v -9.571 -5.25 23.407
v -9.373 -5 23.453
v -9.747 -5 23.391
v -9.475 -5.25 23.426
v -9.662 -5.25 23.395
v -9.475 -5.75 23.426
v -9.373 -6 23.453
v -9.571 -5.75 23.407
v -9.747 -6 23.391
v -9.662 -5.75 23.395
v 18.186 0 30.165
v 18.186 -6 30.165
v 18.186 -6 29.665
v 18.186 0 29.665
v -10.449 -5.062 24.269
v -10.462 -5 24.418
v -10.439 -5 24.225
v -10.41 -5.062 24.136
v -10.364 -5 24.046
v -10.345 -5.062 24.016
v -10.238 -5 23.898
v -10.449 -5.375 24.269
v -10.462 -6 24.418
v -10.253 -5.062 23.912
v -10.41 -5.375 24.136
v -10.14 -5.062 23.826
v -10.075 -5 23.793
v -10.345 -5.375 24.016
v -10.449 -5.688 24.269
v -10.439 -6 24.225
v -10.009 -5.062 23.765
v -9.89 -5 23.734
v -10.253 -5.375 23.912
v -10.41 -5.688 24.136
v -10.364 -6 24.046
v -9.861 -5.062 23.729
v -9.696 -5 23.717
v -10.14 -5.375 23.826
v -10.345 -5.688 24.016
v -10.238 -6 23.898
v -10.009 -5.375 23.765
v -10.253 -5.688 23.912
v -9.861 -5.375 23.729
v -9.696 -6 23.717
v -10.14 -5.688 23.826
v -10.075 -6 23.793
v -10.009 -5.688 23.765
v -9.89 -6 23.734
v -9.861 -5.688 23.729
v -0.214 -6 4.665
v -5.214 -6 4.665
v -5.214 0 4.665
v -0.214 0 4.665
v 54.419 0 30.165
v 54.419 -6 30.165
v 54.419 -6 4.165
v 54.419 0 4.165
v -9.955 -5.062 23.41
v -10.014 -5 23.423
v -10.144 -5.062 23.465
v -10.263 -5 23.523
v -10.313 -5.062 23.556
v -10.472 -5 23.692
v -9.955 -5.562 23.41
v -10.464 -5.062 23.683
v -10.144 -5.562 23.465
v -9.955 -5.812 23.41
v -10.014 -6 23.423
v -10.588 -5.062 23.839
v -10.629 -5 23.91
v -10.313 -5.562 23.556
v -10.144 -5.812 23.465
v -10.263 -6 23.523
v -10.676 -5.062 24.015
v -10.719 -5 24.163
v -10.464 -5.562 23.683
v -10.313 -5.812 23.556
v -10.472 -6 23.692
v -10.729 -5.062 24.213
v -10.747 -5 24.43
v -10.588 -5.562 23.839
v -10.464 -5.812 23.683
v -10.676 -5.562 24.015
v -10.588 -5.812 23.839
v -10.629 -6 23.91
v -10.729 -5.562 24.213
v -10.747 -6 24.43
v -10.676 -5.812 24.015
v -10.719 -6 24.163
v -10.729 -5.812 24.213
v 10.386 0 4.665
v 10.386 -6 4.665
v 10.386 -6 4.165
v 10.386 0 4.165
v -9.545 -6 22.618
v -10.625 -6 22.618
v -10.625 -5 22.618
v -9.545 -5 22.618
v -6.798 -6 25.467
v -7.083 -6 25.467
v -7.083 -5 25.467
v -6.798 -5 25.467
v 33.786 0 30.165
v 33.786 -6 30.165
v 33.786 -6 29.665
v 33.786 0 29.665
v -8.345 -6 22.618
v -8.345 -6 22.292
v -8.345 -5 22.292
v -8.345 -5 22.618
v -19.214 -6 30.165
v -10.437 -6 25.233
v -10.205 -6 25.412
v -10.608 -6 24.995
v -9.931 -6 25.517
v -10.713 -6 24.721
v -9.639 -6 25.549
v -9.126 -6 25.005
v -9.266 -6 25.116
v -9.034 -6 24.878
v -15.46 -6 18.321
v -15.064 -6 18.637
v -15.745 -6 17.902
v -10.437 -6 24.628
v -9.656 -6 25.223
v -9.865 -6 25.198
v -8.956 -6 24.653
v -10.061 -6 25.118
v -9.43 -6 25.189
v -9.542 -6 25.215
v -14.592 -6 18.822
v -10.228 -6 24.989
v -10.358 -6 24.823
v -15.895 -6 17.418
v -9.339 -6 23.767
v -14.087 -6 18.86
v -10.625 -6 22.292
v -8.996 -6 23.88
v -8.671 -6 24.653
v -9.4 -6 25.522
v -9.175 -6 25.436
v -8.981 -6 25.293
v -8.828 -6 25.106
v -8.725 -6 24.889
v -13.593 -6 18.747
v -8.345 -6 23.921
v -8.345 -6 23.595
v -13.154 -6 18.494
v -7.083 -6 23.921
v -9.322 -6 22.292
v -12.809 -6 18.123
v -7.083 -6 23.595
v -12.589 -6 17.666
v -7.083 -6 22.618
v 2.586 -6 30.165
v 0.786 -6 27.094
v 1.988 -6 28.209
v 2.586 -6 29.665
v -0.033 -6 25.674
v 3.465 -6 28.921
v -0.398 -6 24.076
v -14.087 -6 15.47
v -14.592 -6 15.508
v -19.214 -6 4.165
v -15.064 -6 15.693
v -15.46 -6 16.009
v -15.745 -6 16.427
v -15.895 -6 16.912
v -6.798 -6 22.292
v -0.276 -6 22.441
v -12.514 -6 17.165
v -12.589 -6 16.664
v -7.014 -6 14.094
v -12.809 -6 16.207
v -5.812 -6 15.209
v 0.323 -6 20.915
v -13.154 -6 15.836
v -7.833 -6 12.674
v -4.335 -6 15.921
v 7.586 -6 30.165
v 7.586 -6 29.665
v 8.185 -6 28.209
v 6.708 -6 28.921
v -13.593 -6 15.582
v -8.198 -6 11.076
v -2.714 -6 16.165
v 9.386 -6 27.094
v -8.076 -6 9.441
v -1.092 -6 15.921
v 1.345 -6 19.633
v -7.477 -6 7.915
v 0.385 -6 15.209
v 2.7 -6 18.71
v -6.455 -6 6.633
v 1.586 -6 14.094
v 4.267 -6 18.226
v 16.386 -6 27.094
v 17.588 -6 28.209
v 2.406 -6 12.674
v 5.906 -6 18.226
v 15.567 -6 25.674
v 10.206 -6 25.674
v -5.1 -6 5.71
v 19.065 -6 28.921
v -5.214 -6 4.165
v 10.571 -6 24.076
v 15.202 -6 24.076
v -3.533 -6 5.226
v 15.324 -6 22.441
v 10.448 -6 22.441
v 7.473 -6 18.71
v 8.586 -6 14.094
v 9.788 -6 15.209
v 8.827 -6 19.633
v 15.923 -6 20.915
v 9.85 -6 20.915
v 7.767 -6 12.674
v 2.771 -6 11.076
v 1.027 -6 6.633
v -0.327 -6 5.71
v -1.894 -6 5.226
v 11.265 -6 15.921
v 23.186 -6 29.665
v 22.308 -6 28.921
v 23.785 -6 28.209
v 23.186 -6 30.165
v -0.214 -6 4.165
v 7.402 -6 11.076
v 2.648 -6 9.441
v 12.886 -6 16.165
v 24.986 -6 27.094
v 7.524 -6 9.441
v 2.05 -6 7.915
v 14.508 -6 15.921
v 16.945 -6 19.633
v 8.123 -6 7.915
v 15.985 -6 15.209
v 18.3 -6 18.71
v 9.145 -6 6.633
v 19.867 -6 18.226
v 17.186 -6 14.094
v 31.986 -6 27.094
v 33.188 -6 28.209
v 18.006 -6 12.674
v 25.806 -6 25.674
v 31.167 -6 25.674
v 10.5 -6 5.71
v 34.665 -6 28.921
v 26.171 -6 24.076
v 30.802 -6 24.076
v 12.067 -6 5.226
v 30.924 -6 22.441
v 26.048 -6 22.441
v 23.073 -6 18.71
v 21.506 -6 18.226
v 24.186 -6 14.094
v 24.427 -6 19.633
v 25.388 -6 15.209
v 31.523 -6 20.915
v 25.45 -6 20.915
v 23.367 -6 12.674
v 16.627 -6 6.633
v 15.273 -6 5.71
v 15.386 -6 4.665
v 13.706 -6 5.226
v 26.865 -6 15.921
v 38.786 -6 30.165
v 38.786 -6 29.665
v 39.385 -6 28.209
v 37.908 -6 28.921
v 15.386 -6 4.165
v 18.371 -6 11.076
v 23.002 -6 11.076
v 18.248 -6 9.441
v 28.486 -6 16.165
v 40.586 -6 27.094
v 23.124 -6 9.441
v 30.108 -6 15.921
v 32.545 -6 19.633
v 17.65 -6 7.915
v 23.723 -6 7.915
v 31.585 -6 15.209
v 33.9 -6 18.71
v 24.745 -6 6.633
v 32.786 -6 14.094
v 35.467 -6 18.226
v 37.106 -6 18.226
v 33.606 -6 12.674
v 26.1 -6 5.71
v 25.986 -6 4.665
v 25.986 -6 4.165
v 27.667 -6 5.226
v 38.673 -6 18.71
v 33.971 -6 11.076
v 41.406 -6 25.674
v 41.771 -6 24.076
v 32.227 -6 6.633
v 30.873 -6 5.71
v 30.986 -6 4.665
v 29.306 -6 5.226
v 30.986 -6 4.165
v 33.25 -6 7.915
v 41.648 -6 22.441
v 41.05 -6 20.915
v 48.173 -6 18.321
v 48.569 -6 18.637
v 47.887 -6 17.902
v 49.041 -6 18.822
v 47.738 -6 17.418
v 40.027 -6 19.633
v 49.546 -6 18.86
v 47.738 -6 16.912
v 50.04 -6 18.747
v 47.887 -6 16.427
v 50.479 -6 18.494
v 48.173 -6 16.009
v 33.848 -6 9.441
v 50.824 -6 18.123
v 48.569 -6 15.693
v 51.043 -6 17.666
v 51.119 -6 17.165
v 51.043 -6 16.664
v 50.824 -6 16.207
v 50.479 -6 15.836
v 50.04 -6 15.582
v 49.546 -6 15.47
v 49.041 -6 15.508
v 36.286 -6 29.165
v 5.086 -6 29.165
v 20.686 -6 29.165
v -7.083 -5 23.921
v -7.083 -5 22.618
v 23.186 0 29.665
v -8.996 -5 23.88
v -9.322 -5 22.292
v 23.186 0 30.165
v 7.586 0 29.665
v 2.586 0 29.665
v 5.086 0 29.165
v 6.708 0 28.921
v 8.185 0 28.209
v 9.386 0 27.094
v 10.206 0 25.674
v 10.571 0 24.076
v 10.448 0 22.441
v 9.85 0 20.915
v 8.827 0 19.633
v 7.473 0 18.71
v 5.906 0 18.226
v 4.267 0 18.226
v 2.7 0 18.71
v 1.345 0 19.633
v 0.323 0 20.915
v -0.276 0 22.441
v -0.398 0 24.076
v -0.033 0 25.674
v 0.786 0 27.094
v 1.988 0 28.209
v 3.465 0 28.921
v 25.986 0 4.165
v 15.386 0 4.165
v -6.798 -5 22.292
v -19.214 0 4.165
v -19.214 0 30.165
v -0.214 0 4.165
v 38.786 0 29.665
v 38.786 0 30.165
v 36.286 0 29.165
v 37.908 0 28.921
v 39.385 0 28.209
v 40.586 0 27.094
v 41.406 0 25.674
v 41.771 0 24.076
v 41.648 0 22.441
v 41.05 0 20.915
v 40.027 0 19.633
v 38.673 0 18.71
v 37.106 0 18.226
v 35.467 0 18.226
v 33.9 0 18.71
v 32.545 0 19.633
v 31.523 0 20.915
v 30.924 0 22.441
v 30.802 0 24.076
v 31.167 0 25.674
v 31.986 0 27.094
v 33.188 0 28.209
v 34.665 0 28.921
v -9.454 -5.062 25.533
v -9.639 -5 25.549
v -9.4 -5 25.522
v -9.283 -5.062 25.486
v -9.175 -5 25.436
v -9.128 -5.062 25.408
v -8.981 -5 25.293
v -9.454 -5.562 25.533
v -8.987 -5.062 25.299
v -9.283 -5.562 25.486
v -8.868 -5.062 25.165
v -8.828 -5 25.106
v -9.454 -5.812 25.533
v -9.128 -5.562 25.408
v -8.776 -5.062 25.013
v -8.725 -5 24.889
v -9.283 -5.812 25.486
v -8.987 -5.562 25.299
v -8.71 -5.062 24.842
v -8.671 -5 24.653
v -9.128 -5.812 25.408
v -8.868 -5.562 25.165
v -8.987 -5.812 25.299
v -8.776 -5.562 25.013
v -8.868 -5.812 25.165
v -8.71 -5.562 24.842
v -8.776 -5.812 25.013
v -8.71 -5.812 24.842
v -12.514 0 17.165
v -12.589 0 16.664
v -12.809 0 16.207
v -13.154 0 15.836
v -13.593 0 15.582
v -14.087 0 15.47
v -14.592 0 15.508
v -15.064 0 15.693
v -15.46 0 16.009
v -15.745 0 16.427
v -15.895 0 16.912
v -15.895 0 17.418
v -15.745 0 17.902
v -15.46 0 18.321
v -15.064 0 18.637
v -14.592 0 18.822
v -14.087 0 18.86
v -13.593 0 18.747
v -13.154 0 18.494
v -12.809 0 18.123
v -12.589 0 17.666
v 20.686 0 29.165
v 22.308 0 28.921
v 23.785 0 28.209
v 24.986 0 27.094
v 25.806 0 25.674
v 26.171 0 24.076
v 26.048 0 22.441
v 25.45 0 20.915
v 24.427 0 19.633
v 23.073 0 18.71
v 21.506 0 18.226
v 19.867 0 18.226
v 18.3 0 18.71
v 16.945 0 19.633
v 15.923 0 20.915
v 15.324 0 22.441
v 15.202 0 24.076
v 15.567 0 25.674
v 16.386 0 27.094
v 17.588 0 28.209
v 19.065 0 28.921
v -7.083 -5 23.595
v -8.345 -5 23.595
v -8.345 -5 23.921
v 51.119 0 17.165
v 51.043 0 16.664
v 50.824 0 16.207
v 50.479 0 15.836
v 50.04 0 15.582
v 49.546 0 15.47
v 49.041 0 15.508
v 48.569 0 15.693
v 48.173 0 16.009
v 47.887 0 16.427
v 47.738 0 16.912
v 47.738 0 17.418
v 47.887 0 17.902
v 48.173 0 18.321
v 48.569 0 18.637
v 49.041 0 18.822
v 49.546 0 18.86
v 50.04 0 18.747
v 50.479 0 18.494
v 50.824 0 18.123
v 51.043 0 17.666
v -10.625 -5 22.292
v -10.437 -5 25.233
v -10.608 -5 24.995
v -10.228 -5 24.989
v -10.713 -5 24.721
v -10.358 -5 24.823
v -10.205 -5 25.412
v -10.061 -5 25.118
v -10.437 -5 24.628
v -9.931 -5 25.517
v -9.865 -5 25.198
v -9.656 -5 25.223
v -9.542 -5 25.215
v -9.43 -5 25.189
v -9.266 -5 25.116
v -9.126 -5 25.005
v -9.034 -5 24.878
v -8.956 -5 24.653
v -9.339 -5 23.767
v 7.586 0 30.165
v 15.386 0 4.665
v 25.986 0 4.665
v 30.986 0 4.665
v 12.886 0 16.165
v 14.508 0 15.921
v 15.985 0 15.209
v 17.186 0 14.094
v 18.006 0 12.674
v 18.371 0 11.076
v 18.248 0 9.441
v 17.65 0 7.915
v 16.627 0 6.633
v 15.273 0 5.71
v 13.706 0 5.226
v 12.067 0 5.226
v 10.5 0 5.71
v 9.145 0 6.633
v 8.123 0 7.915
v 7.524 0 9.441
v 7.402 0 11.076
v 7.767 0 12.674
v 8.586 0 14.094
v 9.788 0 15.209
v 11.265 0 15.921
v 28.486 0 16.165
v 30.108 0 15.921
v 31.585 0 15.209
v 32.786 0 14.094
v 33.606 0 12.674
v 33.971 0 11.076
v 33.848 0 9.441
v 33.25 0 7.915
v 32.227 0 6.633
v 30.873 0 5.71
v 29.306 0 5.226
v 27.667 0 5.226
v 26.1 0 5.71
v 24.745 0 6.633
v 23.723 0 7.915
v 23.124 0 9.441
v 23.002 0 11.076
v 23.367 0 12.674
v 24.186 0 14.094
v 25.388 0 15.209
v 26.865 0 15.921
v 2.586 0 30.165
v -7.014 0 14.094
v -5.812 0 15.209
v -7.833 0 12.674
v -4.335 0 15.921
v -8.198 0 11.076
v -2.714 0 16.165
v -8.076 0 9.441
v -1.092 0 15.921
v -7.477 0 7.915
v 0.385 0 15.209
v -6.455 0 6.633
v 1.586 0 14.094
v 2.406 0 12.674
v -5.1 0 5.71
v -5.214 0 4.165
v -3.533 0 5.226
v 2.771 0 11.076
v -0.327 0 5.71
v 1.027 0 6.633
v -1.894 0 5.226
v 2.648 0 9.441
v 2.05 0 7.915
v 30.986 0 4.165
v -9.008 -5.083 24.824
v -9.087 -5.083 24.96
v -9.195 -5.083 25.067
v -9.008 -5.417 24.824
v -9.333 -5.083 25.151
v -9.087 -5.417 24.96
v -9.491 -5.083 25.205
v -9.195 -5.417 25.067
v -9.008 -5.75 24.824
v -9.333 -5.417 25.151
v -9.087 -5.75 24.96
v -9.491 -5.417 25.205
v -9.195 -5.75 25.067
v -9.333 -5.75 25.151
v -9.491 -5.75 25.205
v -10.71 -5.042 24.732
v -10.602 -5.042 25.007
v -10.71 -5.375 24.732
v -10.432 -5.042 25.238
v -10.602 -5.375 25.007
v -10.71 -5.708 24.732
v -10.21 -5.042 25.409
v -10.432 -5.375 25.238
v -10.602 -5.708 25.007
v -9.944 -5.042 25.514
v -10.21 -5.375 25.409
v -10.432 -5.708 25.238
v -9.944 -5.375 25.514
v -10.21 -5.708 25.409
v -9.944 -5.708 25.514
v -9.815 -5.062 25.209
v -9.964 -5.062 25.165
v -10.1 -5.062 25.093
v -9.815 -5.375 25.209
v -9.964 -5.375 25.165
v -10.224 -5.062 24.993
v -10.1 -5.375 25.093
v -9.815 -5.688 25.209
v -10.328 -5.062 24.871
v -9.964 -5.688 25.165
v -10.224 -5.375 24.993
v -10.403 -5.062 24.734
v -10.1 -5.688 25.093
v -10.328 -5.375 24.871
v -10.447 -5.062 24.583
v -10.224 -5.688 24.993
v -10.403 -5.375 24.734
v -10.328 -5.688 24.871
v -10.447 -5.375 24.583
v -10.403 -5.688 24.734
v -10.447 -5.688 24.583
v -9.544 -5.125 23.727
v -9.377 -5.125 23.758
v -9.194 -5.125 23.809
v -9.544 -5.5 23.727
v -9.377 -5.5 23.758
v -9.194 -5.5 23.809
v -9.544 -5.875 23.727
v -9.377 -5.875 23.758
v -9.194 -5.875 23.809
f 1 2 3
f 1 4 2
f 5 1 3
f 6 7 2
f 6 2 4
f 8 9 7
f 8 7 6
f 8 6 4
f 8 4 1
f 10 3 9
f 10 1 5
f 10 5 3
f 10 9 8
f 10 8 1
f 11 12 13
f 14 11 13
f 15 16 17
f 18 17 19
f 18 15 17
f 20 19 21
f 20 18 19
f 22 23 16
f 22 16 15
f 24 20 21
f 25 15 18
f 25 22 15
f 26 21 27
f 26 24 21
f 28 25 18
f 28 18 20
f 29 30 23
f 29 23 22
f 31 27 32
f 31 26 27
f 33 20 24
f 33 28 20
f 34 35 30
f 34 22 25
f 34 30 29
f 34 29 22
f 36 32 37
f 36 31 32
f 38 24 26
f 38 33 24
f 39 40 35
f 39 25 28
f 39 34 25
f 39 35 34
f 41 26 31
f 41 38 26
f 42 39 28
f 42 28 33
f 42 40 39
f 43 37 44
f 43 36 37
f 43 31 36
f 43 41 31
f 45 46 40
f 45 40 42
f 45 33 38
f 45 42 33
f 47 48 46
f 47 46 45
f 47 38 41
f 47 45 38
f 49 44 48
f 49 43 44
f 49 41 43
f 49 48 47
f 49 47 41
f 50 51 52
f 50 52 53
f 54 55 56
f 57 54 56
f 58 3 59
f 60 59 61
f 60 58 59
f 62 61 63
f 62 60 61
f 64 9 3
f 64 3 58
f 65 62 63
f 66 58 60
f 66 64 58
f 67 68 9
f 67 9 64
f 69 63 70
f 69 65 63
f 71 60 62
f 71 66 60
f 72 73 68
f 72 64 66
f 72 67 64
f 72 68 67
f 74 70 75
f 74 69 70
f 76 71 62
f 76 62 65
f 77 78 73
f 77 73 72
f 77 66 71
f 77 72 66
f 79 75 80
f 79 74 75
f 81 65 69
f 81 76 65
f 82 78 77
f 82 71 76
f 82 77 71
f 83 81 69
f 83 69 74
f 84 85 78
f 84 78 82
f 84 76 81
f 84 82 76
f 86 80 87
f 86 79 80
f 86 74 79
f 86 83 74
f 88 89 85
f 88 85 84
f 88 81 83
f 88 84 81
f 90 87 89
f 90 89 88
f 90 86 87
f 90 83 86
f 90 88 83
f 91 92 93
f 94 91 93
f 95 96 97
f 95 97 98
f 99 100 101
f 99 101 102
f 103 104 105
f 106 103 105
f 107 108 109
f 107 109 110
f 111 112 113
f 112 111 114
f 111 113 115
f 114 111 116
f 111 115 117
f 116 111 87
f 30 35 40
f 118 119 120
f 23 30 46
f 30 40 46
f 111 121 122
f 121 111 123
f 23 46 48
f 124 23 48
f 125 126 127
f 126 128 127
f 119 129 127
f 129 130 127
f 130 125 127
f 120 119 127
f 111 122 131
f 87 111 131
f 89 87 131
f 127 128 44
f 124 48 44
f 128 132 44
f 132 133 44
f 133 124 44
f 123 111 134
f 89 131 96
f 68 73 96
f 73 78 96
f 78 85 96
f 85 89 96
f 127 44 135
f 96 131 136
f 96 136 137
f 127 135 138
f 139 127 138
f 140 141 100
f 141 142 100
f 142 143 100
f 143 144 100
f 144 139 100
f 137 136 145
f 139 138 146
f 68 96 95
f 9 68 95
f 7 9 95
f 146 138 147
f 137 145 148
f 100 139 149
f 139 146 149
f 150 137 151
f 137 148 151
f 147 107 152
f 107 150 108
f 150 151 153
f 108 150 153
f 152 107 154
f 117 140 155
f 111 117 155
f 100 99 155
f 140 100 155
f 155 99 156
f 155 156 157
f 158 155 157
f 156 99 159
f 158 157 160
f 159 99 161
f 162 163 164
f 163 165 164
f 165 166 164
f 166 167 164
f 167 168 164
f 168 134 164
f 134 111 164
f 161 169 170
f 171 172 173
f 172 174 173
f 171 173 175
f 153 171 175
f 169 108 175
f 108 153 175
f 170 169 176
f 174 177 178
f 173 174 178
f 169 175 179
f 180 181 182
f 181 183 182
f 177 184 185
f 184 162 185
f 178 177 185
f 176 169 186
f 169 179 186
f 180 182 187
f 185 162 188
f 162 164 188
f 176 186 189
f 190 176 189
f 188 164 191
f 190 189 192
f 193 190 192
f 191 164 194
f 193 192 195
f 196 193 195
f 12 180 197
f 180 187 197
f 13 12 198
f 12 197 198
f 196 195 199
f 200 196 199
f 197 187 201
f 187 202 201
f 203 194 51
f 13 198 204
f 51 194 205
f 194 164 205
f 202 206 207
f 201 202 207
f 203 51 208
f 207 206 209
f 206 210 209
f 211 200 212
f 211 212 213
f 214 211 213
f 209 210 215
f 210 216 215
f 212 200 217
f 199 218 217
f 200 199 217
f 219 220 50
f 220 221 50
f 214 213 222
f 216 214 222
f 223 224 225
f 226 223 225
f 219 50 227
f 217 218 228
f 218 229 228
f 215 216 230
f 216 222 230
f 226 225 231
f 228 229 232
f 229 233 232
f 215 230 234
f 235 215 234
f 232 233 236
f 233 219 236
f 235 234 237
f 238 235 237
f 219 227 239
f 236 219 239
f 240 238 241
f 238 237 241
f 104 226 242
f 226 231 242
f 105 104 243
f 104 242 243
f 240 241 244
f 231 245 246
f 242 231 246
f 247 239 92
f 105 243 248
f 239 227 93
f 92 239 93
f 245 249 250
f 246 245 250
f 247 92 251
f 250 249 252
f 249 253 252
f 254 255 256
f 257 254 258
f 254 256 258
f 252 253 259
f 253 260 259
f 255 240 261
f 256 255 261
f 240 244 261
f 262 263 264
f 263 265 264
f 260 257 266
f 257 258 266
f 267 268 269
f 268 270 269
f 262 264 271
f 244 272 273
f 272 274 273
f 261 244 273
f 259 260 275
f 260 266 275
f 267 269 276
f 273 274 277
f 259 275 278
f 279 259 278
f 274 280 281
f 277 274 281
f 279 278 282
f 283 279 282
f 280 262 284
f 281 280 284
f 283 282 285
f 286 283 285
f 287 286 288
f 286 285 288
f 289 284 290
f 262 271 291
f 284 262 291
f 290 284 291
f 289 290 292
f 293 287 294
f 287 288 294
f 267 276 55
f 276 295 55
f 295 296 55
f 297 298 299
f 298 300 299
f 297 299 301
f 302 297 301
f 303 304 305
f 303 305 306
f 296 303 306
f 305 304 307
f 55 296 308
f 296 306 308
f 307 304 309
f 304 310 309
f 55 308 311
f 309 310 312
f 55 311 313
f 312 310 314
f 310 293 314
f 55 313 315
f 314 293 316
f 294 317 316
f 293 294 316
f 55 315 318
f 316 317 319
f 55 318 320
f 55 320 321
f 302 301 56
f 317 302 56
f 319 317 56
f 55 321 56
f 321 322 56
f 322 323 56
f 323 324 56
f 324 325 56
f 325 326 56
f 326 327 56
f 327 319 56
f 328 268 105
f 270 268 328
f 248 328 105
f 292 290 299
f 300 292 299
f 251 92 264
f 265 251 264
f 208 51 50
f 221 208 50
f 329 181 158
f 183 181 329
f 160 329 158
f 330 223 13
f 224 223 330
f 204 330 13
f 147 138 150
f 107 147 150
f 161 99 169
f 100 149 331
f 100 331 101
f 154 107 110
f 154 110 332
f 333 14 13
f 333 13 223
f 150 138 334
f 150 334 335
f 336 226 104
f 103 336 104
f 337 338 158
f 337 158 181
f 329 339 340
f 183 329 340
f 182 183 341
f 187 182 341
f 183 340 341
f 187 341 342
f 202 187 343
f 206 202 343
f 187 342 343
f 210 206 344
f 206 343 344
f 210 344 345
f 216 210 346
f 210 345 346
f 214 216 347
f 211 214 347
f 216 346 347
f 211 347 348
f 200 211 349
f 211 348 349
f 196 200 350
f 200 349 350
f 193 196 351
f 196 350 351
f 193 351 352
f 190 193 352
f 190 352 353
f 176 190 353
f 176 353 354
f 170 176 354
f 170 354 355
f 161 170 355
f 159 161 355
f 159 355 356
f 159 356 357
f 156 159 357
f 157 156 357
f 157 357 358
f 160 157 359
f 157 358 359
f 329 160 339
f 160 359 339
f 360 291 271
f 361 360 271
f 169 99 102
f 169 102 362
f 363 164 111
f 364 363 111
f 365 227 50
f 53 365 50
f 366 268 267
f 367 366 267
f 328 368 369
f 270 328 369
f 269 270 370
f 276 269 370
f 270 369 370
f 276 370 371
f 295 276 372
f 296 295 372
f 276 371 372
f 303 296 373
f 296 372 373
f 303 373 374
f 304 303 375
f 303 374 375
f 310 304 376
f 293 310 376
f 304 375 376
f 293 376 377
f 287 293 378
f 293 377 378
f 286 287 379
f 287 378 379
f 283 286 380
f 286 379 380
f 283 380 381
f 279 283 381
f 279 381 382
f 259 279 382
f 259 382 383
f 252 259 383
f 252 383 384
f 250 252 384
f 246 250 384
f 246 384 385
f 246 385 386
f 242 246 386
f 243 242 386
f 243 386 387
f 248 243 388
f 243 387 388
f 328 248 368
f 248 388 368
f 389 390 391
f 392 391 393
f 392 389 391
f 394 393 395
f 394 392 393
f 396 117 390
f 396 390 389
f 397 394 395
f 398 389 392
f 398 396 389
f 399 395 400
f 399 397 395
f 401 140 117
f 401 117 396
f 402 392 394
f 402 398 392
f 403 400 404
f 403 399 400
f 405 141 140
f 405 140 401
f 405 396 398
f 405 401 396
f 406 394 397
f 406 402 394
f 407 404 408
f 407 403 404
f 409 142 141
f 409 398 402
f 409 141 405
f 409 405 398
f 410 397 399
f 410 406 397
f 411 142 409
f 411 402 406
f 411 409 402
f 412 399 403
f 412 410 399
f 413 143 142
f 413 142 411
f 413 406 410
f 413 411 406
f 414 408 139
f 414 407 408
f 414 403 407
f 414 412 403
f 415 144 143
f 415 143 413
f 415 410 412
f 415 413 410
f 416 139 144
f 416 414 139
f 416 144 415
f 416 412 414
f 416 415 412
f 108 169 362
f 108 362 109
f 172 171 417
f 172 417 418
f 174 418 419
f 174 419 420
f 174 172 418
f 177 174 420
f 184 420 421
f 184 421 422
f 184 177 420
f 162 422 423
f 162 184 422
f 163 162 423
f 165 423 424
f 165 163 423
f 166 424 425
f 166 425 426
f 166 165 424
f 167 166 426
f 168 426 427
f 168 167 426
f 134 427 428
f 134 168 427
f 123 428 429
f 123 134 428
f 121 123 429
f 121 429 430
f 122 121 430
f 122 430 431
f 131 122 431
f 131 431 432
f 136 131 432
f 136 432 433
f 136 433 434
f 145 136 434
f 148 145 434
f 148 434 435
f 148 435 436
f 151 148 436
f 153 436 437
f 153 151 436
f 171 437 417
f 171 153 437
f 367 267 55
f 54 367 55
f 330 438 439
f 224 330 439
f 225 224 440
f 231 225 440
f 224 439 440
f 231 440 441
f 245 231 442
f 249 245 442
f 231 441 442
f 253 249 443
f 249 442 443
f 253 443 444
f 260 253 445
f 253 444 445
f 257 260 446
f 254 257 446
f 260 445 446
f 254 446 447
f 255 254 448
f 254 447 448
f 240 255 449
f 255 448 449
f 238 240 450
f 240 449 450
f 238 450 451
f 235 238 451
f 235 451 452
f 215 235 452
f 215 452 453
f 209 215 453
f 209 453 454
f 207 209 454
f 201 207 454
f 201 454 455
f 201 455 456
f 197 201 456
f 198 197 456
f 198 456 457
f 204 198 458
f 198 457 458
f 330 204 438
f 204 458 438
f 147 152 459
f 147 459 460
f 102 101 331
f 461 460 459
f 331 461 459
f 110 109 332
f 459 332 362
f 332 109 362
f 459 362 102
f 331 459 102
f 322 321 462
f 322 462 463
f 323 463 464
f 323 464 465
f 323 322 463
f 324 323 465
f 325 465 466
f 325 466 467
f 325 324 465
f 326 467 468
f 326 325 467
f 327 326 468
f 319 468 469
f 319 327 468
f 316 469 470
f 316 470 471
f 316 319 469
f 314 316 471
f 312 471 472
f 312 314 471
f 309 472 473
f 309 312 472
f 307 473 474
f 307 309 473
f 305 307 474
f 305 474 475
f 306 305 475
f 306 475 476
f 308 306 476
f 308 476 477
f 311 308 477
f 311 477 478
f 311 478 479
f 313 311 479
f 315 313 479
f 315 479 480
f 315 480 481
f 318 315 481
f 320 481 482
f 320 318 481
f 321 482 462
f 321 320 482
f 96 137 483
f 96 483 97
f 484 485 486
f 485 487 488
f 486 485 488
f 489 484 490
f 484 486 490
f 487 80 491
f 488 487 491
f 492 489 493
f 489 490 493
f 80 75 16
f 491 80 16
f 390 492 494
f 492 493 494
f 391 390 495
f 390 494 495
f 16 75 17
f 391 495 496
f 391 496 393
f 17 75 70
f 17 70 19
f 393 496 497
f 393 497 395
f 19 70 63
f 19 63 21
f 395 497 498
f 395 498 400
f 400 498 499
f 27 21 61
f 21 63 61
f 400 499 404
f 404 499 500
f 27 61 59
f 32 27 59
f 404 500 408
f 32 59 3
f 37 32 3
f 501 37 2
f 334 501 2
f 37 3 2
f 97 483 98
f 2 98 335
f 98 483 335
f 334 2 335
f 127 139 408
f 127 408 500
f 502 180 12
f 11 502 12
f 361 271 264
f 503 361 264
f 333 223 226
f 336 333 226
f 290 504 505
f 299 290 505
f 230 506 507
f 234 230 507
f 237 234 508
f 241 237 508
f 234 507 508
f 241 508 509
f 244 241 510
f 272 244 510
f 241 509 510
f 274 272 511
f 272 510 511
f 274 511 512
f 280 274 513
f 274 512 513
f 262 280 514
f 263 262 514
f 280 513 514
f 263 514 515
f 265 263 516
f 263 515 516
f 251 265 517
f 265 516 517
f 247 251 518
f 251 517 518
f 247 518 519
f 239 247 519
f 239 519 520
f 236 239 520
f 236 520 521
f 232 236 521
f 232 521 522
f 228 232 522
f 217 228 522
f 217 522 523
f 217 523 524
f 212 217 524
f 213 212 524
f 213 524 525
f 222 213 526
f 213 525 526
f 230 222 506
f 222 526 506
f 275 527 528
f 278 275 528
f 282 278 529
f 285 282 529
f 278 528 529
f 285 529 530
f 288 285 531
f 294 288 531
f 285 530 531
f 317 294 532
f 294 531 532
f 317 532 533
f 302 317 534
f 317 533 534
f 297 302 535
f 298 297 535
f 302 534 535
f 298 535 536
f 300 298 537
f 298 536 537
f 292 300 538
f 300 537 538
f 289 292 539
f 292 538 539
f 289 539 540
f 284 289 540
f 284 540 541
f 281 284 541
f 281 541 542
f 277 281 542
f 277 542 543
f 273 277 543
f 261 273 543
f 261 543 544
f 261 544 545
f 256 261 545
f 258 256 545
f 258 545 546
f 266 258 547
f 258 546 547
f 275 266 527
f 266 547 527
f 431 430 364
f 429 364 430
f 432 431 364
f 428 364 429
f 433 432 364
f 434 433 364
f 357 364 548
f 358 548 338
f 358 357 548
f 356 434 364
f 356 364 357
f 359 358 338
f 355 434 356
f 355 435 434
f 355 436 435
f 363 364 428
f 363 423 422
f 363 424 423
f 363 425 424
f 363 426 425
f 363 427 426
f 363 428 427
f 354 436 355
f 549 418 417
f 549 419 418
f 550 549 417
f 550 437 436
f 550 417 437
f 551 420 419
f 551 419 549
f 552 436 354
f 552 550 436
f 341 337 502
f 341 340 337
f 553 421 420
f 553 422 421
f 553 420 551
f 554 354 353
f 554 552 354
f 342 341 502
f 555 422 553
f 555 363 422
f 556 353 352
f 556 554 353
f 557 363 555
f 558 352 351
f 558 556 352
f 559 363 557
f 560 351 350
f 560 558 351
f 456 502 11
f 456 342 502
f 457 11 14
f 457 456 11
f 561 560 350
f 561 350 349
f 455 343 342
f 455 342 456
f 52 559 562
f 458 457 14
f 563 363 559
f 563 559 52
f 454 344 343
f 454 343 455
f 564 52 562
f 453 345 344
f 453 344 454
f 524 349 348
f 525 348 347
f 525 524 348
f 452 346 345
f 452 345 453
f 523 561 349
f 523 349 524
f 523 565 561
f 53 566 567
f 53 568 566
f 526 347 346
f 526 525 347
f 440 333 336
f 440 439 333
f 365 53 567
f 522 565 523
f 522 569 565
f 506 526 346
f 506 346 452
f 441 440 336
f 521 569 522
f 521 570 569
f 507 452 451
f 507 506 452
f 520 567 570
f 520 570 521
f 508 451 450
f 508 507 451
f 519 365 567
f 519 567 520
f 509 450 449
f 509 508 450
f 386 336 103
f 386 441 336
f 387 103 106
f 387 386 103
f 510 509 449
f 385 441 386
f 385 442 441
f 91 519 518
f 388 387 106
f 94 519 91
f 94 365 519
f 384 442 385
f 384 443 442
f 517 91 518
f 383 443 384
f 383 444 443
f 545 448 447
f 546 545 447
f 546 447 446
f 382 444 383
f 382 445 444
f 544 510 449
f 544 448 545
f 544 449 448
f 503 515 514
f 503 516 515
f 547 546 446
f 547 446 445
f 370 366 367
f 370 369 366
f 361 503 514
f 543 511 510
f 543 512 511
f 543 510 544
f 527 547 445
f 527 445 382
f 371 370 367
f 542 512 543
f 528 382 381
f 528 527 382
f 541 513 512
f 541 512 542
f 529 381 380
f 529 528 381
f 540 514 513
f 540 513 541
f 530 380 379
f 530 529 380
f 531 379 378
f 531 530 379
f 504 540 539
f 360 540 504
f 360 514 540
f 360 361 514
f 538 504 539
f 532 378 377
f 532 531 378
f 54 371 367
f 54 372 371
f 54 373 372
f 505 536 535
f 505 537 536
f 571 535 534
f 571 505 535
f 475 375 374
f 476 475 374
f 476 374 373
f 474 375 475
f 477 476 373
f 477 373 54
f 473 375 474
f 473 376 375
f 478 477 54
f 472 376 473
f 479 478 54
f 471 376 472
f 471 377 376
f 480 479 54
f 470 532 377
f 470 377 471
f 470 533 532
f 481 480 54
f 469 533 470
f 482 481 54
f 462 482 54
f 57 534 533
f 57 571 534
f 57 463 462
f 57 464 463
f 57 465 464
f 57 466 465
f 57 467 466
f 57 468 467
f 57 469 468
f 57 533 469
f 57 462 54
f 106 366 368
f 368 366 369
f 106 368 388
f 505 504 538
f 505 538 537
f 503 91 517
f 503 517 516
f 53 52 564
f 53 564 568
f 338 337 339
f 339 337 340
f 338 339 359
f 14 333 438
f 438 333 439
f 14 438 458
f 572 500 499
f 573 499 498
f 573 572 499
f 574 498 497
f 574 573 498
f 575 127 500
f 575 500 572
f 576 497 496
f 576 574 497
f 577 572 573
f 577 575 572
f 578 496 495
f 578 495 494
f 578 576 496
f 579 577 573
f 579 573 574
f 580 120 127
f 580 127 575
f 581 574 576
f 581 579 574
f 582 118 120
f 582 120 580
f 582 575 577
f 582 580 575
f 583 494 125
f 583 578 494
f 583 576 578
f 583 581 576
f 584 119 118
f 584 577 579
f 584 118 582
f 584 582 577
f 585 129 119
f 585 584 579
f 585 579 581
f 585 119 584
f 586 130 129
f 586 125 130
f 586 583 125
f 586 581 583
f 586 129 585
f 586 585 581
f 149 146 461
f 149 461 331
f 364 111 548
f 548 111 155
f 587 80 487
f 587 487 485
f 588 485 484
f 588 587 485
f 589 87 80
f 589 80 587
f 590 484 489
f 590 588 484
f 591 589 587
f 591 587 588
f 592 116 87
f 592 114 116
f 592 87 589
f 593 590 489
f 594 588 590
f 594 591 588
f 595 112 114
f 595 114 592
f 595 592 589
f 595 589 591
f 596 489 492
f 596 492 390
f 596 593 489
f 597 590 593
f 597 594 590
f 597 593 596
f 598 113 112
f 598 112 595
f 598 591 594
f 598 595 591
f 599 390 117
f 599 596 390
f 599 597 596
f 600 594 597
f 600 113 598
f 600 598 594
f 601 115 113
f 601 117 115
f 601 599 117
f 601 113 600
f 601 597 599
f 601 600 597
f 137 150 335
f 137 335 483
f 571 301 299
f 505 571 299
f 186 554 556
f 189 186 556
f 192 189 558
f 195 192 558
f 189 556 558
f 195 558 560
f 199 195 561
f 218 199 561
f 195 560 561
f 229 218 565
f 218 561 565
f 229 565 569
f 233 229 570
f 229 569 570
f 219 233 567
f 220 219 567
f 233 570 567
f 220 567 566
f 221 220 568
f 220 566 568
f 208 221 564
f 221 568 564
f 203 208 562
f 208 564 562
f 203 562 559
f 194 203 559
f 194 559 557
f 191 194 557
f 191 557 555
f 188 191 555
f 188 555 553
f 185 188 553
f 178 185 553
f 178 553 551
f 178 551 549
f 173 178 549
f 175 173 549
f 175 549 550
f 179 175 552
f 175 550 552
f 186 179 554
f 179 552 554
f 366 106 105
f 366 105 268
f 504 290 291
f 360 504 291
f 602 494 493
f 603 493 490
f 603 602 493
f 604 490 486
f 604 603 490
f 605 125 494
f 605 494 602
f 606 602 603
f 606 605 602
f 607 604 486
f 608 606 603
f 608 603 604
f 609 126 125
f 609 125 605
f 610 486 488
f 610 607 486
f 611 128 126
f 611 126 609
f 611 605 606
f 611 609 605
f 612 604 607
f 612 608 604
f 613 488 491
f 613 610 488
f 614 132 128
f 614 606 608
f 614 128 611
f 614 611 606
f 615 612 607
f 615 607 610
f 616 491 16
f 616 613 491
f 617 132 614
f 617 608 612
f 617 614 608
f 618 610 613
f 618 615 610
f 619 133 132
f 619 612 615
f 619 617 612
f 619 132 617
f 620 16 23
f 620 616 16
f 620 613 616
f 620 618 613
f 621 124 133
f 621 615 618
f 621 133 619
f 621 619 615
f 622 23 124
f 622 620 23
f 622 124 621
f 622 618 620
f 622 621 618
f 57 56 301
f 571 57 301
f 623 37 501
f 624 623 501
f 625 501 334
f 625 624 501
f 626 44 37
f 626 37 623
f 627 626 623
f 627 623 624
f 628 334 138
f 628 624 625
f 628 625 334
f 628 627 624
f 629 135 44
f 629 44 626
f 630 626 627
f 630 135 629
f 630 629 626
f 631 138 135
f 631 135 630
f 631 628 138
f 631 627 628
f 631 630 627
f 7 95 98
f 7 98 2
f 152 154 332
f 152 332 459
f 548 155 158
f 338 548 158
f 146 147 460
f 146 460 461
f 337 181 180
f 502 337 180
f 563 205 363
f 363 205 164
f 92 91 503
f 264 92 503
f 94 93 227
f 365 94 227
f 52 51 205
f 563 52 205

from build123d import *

# Parameters (mm, degrees)
SKETCH1_W             = 12
SKETCH1_H             = 12
SKETCH1_R             = 5.5
BOSS_EXTRUDE1_DEPTH   = 6
BOSS_EXTRUDE1_2_DEPTH = 6
BOSS_EXTRUDE1_3_DEPTH = 6
BOSS_EXTRUDE1_4_DEPTH = 6
BOSS_EXTRUDE1_5_DEPTH = 6
BOSS_EXTRUDE1_6_DEPTH = 6
SKETCH1_3_R           = 1.7
BOSS_EXTRUDE2_DEPTH   = 6
CUT_EXTRUDE1_DEPTH    = 1


with BuildPart() as part:
    # Sketch1 → Boss-Extrude1 (new body)
    with BuildSketch(Plane(origin=(0, 0, 0), x_dir=(1, 0, 0), z_dir=(0, 1, 0))):
        with Locations((-2.713611414, -10.664883528)):
            Rectangle(SKETCH1_W, SKETCH1_H)
        with Locations((-2.713611414, -10.664883528)):
            Circle(SKETCH1_R, mode=Mode.SUBTRACT)
    extrude(amount=-BOSS_EXTRUDE1_DEPTH)



with BuildPart() as body_2:
    # Sketch1 → Boss-Extrude1 2 (new body)
    with BuildSketch(Plane(origin=(0, 0, 0), x_dir=(1, 0, 0), z_dir=(0, 1, 0))):
        with Locations((12.886388586, -10.664882884)):
            Rectangle(SKETCH1_W, SKETCH1_H)
        with Locations((12.886388586, -10.664882884)):
            Circle(SKETCH1_R, mode=Mode.SUBTRACT)
    extrude(amount=-BOSS_EXTRUDE1_2_DEPTH)


with BuildPart() as body_3:
    # Sketch1 → Boss-Extrude1 3 (new body)
    with BuildSketch(Plane(origin=(0, 0, 0), x_dir=(1, 0, 0), z_dir=(0, 1, 0))):
        with Locations((5.086388588, -23.66488245)):
            Rectangle(SKETCH1_W, SKETCH1_H)
        with Locations((5.086388588, -23.66488245)):
            Circle(SKETCH1_R, mode=Mode.SUBTRACT)
    extrude(amount=-BOSS_EXTRUDE1_3_DEPTH)


with BuildPart() as body_4:
    # Sketch1 → Boss-Extrude1 4 (new body)
    with BuildSketch(Plane(origin=(0, 0, 0), x_dir=(1, 0, 0), z_dir=(0, 1, 0))):
        with Locations((20.686388588, -23.664882884)):
            Rectangle(SKETCH1_W, SKETCH1_H)
        with Locations((20.686388588, -23.664882884)):
            Circle(SKETCH1_R, mode=Mode.SUBTRACT)
    extrude(amount=-BOSS_EXTRUDE1_4_DEPTH)


with BuildPart() as body_5:
    # Sketch1 → Boss-Extrude1 5 (new body)
    with BuildSketch(Plane(origin=(0, 0, 0), x_dir=(1, 0, 0), z_dir=(0, 1, 0))):
        with Locations((28.486388586, -10.664882884)):
            Rectangle(SKETCH1_W, SKETCH1_H)
        with Locations((28.486388586, -10.664882884)):
            Circle(SKETCH1_R, mode=Mode.SUBTRACT)
    extrude(amount=-BOSS_EXTRUDE1_5_DEPTH)


with BuildPart() as body_6:
    # Sketch1 → Boss-Extrude1 6 (new body)
    with BuildSketch(Plane(origin=(0, 0, 0), x_dir=(1, 0, 0), z_dir=(0, 1, 0))):
        with Locations((36.286388588, -23.664883087)):
            Rectangle(SKETCH1_W, SKETCH1_H)
        with Locations((36.286388588, -23.664883087)):
            Circle(SKETCH1_R, mode=Mode.SUBTRACT)
    extrude(amount=-BOSS_EXTRUDE1_6_DEPTH)


with BuildPart() as part_1:
    add(part.part)

    add(body_2.part)  # Boss-Extrude2 merges body 2

    add(body_3.part)  # Boss-Extrude2 merges body 3

    add(body_4.part)  # Boss-Extrude2 merges body 4

    add(body_5.part)  # Boss-Extrude2 merges body 5

    add(body_6.part)  # Boss-Extrude2 merges body 6
    # Sketch1<3> → Boss-Extrude2 (add)
    with BuildSketch(Plane(origin=(0, 0, 0), x_dir=(1, 0, 0), z_dir=(0, 1, 0))):
        Polygon((6.386388586, -4.164882884), (3.786388586, -4.164883528), (-0.213611414, -4.164883528), (-0.213611414, -4.664883528), (3.286388586, -4.664883528), (3.286388586, -16.664883528), (-8.713611414, -16.664883528), (-8.713611414, -4.664883528), (-5.213611414, -4.664883528), (-5.213611414, -4.164883528), (-19.213611414, -4.164883528), (-19.213611414, -30.16488245), (2.586388588, -30.16488245), (2.586388588, -29.66488245), (-0.913611412, -29.66488245), (-0.913611412, -17.66488245), (11.086388588, -17.66488245), (11.086388588, -29.66488245), (7.586388588, -29.66488245), (7.586388588, -30.16488245), (11.586388588, -30.16488245), (14.186388588, -30.164882884), (18.186388588, -30.164882884), (18.186388588, -29.664882884), (14.686388588, -29.664882884), (14.686388588, -17.664882884), (26.686388588, -17.664882884), (26.686388588, -29.664882884), (23.186388588, -29.664882884), (23.186388588, -30.164882884), (27.186388588, -30.164882884), (29.786388588, -30.164883087), (33.786388588, -30.164883087), (33.786388588, -29.664883087), (30.286388588, -29.664883087), (30.286388588, -17.664883087), (42.286388588, -17.664883087), (42.286388588, -29.664883087), (38.786388588, -29.664883087), (38.786388588, -30.164883087), (42.786388588, -30.164883087), (54.418988347, -30.16488245), (54.418988347, -4.164883528), (34.986388586, -4.164882884), (30.986388586, -4.164882884), (30.986388586, -4.664882884), (34.486388586, -4.664882884), (34.486388586, -16.664882884), (22.486388586, -16.664882884), (22.486388586, -4.664882884), (25.986388586, -4.664882884), (25.986388586, -4.164882884), (15.386388586, -4.164882884), (15.386388586, -4.664882884), (18.886388586, -4.664882884), (18.886388586, -16.664882884), (6.886388586, -16.664882884), (6.886388586, -4.664882884), (10.386388586, -4.664882884), (10.386388586, -4.164882884), align=None)
        with Locations((-14.213611414, -17.164882989)):
            Circle(SKETCH1_3_R, mode=Mode.SUBTRACT)
        with Locations((49.418988347, -17.164882989)):
            Circle(SKETCH1_3_R, mode=Mode.SUBTRACT)
    extrude(amount=-BOSS_EXTRUDE2_DEPTH)

    # Sketch2 → Cut-Extrude1 (cut)
    with BuildSketch(Plane(origin=(0, -6, 0), x_dir=(-1, 0, 0), z_dir=(0, -1, 0))):
        Polygon((6.798219501, -22.292392997), (8.345014372, -22.292392997), (8.345014372, -22.618034023), (7.083155398, -22.618034023), (7.083155398, -23.5949571), (8.345014372, -23.5949571), (8.345014372, -23.920598125), (7.083155398, -23.920598125), (7.083155398, -25.467392997), (6.798219501, -25.467392997), align=None)
        with BuildLine():
            Line((10.624501552, -22.292392997), (10.624501552, -22.618034023))
            Line((10.624501552, -22.618034023), (9.545179637, -22.618034023))
            Line((9.545179637, -22.618034023), (9.373454877, -23.453125169))
            add(Edge.make_bspline(
                [(9.373454877, -23.453125169), (9.407069849, -23.443844851), (9.47219354, -23.425865702), (9.568314271, -23.405903325), (9.65956577, -23.393869672), (9.718779856, -23.392226555), (9.747433243, -23.391431459)],
                knots=[0, 0, 0, 0, 1.100273476, 2.13160584, 3.095893838, 4, 4, 4, 4], degree=3))
            add(Edge.make_bspline(
                [(9.747433243, -23.391431459), (9.782887778, -23.392198843), (9.852600253, -23.393707713), (9.95459844, -23.408196462), (10.051964708, -23.431001956), (10.144495429, -23.462861287), (10.232361786, -23.50360083), (10.314755359, -23.55449149), (10.392912895, -23.613939584), (10.465432248, -23.682288273), (10.531222156, -23.757510025), (10.589067018, -23.838388951), (10.638200225, -23.924139045), (10.677716053, -24.015579597), (10.709270413, -24.111699686), (10.73027258, -24.213510672), (10.744257737, -24.320052895), (10.745820188, -24.392900612), (10.746616936, -24.430048246)],
                knots=[0, 0, 0, 0, 1.052922333, 2.070308379, 3.05430497, 4.020497103, 4.973039431, 5.925935799, 6.892292201, 7.88610001, 8.88166317, 9.857072816, 10.836096531, 11.812156883, 12.81219415, 13.836441305, 14.89672472, 16, 16, 16, 16], degree=3))
            add(Edge.make_bspline(
                [(10.746616936, -24.430048246), (10.746013618, -24.455921974), (10.744815135, -24.50731977), (10.738720416, -24.583650581), (10.726985874, -24.658365436), (10.711230867, -24.731474249), (10.690781673, -24.802838608), (10.666026603, -24.87266278), (10.635731635, -24.940512173), (10.602501745, -25.007028781), (10.565085297, -25.070708856), (10.523557651, -25.130261865), (10.479683241, -25.186581177), (10.43247427, -25.239062778), (10.381491939, -25.287361801), (10.327353683, -25.331764885), (10.270491502, -25.373022949), (10.210025675, -25.409461241), (10.147303566, -25.442991922), (10.081419397, -25.470499703), (10.013872905, -25.495092824), (9.94369191, -25.514695753), (9.87103538, -25.530055999), (9.795783548, -25.540488687), (9.718331083, -25.548087312), (9.665830179, -25.548562979), (9.639310246, -25.548803254)],
                knots=[0, 0, 0, 0, 1.056347294, 2.098418968, 3.122841568, 4.141288669, 5.149314143, 6.15115421, 7.162517403, 8.180376062, 9.185164535, 10.17417709, 11.141909838, 12.097768115, 13.052685741, 14.0056014, 14.954263652, 15.917497458, 16.885230207, 17.854509472, 18.828990115, 19.81800267, 20.826176721, 21.857883937, 22.917946725, 24, 24, 24, 24], degree=3))
            add(Edge.make_bspline(
                [(9.639310246, -25.548803254), (9.607674382, -25.548176565), (9.545434557, -25.546943629), (9.454248042, -25.534045431), (9.366514079, -25.51557245), (9.282938915, -25.487780977), (9.202773555, -25.452958217), (9.127097232, -25.408947118), (9.053976278, -25.359073217), (8.986383216, -25.300217468), (8.923648742, -25.235886814), (8.867490695, -25.166075239), (8.817476664, -25.09193496), (8.774407565, -25.01310592), (8.737670075, -24.929795253), (8.708809335, -24.841690816), (8.685515399, -24.749252955), (8.675660725, -24.685613699), (8.670655398, -24.653290433)],
                knots=[0, 0, 0, 0, 1.0467383, 2.05933395, 3.04377827, 4.011590433, 4.970194871, 5.932262533, 6.905835911, 7.896367577, 8.894135286, 9.877477877, 10.858688626, 11.851381753, 12.8477658, 13.868841284, 14.917554742, 16, 16, 16, 16], degree=3))
            Line((8.670655398, -24.653290433), (8.955591295, -24.653290433))
            add(Edge.make_bspline(
                [(8.955591295, -24.653290433), (8.962602201, -24.683567644), (8.976077551, -24.741762123), (9.005655623, -24.823524126), (9.041819667, -24.896385136), (9.084822183, -24.961308972), (9.13612114, -25.017922848), (9.19465855, -25.068375469), (9.26028827, -25.113891479), (9.333216414, -25.151830703), (9.410153993, -25.184187358), (9.490678534, -25.205733539), (9.572597477, -25.220883634), (9.628004284, -25.22240016), (9.655846704, -25.223162228)],
                knots=[0, 0, 0, 0, 1.136247022, 2.183929868, 3.172523383, 4.106158343, 5.02341133, 5.958108904, 6.928429099, 7.938127109, 8.96079061, 9.975095812, 10.982467395, 12, 12, 12, 12], degree=3))
            add(Edge.make_bspline(
                [(9.655846704, -25.223162228), (9.683023293, -25.222417665), (9.736534219, -25.220951615), (9.815284548, -25.209667654), (9.891314798, -25.192289), (9.963874758, -25.166281346), (10.034234154, -25.134672208), (10.100613217, -25.094109247), (10.164932256, -25.047427659), (10.225192063, -24.993945573), (10.280382135, -24.935008778), (10.329146616, -24.871982857), (10.369765673, -24.804748289), (10.4039959, -24.734469072), (10.429988536, -24.660374952), (10.448531426, -24.582813172), (10.459419915, -24.501592154), (10.460917771, -24.446193566), (10.461681039, -24.417963911)],
                knots=[0, 0, 0, 0, 1.027316725, 2.022795036, 3.002884548, 3.971462791, 4.93288096, 5.914575861, 6.907176829, 7.935150275, 8.956128384, 9.956726525, 10.942570165, 11.921478529, 12.907843606, 13.90538589, 14.932640048, 16, 16, 16, 16], degree=3))
            add(Edge.make_bspline(
                [(10.461681039, -24.417963911), (10.461083704, -24.392495193), (10.459914506, -24.342643802), (10.450361774, -24.269710237), (10.433745664, -24.20070112), (10.410682573, -24.135283207), (10.381400448, -24.073394799), (10.345617007, -24.014972023), (10.302660711, -23.960784903), (10.25359164, -23.910808086), (10.199836132, -23.864684521), (10.140469308, -23.825365243), (10.076733517, -23.79228726), (10.009396666, -23.76374129), (9.93685708, -23.743239186), (9.860551277, -23.72784689), (9.779655264, -23.718942953), (9.72434614, -23.717707526), (9.695915815, -23.717072484)],
                knots=[0, 0, 0, 0, 1.045622112, 2.046656509, 3.013763289, 3.955457236, 4.890082067, 5.820317437, 6.762574623, 7.722996705, 8.69280354, 9.665887285, 10.63943826, 11.638615906, 12.663482002, 13.728887084, 14.832589034, 16, 16, 16, 16], degree=3))
            add(Edge.make_bspline(
                [(9.695915815, -23.717072484), (9.671306001, -23.717599164), (9.620492978, -23.718686622), (9.5425487, -23.726693516), (9.460641208, -23.73961059), (9.375084487, -23.757378115), (9.285621598, -23.780629163), (9.192441334, -23.808491603), (9.095347778, -23.841803701), (9.0299267, -23.866960781), (8.996296424, -23.879892997)],
                knots=[0, 0, 0, 0, 0.817624296, 1.688186739, 2.600797293, 3.572016777, 4.590301741, 5.671205678, 6.80286297, 8, 8, 8, 8], degree=3))
            Line((8.996296424, -23.879892997), (9.321937449, -22.292392997))
            Line((9.321937449, -22.292392997), (10.624501552, -22.292392997))
        make_face()
    extrude(amount=-CUT_EXTRUDE1_DEPTH, mode=Mode.SUBTRACT)


solid = part_1.part
